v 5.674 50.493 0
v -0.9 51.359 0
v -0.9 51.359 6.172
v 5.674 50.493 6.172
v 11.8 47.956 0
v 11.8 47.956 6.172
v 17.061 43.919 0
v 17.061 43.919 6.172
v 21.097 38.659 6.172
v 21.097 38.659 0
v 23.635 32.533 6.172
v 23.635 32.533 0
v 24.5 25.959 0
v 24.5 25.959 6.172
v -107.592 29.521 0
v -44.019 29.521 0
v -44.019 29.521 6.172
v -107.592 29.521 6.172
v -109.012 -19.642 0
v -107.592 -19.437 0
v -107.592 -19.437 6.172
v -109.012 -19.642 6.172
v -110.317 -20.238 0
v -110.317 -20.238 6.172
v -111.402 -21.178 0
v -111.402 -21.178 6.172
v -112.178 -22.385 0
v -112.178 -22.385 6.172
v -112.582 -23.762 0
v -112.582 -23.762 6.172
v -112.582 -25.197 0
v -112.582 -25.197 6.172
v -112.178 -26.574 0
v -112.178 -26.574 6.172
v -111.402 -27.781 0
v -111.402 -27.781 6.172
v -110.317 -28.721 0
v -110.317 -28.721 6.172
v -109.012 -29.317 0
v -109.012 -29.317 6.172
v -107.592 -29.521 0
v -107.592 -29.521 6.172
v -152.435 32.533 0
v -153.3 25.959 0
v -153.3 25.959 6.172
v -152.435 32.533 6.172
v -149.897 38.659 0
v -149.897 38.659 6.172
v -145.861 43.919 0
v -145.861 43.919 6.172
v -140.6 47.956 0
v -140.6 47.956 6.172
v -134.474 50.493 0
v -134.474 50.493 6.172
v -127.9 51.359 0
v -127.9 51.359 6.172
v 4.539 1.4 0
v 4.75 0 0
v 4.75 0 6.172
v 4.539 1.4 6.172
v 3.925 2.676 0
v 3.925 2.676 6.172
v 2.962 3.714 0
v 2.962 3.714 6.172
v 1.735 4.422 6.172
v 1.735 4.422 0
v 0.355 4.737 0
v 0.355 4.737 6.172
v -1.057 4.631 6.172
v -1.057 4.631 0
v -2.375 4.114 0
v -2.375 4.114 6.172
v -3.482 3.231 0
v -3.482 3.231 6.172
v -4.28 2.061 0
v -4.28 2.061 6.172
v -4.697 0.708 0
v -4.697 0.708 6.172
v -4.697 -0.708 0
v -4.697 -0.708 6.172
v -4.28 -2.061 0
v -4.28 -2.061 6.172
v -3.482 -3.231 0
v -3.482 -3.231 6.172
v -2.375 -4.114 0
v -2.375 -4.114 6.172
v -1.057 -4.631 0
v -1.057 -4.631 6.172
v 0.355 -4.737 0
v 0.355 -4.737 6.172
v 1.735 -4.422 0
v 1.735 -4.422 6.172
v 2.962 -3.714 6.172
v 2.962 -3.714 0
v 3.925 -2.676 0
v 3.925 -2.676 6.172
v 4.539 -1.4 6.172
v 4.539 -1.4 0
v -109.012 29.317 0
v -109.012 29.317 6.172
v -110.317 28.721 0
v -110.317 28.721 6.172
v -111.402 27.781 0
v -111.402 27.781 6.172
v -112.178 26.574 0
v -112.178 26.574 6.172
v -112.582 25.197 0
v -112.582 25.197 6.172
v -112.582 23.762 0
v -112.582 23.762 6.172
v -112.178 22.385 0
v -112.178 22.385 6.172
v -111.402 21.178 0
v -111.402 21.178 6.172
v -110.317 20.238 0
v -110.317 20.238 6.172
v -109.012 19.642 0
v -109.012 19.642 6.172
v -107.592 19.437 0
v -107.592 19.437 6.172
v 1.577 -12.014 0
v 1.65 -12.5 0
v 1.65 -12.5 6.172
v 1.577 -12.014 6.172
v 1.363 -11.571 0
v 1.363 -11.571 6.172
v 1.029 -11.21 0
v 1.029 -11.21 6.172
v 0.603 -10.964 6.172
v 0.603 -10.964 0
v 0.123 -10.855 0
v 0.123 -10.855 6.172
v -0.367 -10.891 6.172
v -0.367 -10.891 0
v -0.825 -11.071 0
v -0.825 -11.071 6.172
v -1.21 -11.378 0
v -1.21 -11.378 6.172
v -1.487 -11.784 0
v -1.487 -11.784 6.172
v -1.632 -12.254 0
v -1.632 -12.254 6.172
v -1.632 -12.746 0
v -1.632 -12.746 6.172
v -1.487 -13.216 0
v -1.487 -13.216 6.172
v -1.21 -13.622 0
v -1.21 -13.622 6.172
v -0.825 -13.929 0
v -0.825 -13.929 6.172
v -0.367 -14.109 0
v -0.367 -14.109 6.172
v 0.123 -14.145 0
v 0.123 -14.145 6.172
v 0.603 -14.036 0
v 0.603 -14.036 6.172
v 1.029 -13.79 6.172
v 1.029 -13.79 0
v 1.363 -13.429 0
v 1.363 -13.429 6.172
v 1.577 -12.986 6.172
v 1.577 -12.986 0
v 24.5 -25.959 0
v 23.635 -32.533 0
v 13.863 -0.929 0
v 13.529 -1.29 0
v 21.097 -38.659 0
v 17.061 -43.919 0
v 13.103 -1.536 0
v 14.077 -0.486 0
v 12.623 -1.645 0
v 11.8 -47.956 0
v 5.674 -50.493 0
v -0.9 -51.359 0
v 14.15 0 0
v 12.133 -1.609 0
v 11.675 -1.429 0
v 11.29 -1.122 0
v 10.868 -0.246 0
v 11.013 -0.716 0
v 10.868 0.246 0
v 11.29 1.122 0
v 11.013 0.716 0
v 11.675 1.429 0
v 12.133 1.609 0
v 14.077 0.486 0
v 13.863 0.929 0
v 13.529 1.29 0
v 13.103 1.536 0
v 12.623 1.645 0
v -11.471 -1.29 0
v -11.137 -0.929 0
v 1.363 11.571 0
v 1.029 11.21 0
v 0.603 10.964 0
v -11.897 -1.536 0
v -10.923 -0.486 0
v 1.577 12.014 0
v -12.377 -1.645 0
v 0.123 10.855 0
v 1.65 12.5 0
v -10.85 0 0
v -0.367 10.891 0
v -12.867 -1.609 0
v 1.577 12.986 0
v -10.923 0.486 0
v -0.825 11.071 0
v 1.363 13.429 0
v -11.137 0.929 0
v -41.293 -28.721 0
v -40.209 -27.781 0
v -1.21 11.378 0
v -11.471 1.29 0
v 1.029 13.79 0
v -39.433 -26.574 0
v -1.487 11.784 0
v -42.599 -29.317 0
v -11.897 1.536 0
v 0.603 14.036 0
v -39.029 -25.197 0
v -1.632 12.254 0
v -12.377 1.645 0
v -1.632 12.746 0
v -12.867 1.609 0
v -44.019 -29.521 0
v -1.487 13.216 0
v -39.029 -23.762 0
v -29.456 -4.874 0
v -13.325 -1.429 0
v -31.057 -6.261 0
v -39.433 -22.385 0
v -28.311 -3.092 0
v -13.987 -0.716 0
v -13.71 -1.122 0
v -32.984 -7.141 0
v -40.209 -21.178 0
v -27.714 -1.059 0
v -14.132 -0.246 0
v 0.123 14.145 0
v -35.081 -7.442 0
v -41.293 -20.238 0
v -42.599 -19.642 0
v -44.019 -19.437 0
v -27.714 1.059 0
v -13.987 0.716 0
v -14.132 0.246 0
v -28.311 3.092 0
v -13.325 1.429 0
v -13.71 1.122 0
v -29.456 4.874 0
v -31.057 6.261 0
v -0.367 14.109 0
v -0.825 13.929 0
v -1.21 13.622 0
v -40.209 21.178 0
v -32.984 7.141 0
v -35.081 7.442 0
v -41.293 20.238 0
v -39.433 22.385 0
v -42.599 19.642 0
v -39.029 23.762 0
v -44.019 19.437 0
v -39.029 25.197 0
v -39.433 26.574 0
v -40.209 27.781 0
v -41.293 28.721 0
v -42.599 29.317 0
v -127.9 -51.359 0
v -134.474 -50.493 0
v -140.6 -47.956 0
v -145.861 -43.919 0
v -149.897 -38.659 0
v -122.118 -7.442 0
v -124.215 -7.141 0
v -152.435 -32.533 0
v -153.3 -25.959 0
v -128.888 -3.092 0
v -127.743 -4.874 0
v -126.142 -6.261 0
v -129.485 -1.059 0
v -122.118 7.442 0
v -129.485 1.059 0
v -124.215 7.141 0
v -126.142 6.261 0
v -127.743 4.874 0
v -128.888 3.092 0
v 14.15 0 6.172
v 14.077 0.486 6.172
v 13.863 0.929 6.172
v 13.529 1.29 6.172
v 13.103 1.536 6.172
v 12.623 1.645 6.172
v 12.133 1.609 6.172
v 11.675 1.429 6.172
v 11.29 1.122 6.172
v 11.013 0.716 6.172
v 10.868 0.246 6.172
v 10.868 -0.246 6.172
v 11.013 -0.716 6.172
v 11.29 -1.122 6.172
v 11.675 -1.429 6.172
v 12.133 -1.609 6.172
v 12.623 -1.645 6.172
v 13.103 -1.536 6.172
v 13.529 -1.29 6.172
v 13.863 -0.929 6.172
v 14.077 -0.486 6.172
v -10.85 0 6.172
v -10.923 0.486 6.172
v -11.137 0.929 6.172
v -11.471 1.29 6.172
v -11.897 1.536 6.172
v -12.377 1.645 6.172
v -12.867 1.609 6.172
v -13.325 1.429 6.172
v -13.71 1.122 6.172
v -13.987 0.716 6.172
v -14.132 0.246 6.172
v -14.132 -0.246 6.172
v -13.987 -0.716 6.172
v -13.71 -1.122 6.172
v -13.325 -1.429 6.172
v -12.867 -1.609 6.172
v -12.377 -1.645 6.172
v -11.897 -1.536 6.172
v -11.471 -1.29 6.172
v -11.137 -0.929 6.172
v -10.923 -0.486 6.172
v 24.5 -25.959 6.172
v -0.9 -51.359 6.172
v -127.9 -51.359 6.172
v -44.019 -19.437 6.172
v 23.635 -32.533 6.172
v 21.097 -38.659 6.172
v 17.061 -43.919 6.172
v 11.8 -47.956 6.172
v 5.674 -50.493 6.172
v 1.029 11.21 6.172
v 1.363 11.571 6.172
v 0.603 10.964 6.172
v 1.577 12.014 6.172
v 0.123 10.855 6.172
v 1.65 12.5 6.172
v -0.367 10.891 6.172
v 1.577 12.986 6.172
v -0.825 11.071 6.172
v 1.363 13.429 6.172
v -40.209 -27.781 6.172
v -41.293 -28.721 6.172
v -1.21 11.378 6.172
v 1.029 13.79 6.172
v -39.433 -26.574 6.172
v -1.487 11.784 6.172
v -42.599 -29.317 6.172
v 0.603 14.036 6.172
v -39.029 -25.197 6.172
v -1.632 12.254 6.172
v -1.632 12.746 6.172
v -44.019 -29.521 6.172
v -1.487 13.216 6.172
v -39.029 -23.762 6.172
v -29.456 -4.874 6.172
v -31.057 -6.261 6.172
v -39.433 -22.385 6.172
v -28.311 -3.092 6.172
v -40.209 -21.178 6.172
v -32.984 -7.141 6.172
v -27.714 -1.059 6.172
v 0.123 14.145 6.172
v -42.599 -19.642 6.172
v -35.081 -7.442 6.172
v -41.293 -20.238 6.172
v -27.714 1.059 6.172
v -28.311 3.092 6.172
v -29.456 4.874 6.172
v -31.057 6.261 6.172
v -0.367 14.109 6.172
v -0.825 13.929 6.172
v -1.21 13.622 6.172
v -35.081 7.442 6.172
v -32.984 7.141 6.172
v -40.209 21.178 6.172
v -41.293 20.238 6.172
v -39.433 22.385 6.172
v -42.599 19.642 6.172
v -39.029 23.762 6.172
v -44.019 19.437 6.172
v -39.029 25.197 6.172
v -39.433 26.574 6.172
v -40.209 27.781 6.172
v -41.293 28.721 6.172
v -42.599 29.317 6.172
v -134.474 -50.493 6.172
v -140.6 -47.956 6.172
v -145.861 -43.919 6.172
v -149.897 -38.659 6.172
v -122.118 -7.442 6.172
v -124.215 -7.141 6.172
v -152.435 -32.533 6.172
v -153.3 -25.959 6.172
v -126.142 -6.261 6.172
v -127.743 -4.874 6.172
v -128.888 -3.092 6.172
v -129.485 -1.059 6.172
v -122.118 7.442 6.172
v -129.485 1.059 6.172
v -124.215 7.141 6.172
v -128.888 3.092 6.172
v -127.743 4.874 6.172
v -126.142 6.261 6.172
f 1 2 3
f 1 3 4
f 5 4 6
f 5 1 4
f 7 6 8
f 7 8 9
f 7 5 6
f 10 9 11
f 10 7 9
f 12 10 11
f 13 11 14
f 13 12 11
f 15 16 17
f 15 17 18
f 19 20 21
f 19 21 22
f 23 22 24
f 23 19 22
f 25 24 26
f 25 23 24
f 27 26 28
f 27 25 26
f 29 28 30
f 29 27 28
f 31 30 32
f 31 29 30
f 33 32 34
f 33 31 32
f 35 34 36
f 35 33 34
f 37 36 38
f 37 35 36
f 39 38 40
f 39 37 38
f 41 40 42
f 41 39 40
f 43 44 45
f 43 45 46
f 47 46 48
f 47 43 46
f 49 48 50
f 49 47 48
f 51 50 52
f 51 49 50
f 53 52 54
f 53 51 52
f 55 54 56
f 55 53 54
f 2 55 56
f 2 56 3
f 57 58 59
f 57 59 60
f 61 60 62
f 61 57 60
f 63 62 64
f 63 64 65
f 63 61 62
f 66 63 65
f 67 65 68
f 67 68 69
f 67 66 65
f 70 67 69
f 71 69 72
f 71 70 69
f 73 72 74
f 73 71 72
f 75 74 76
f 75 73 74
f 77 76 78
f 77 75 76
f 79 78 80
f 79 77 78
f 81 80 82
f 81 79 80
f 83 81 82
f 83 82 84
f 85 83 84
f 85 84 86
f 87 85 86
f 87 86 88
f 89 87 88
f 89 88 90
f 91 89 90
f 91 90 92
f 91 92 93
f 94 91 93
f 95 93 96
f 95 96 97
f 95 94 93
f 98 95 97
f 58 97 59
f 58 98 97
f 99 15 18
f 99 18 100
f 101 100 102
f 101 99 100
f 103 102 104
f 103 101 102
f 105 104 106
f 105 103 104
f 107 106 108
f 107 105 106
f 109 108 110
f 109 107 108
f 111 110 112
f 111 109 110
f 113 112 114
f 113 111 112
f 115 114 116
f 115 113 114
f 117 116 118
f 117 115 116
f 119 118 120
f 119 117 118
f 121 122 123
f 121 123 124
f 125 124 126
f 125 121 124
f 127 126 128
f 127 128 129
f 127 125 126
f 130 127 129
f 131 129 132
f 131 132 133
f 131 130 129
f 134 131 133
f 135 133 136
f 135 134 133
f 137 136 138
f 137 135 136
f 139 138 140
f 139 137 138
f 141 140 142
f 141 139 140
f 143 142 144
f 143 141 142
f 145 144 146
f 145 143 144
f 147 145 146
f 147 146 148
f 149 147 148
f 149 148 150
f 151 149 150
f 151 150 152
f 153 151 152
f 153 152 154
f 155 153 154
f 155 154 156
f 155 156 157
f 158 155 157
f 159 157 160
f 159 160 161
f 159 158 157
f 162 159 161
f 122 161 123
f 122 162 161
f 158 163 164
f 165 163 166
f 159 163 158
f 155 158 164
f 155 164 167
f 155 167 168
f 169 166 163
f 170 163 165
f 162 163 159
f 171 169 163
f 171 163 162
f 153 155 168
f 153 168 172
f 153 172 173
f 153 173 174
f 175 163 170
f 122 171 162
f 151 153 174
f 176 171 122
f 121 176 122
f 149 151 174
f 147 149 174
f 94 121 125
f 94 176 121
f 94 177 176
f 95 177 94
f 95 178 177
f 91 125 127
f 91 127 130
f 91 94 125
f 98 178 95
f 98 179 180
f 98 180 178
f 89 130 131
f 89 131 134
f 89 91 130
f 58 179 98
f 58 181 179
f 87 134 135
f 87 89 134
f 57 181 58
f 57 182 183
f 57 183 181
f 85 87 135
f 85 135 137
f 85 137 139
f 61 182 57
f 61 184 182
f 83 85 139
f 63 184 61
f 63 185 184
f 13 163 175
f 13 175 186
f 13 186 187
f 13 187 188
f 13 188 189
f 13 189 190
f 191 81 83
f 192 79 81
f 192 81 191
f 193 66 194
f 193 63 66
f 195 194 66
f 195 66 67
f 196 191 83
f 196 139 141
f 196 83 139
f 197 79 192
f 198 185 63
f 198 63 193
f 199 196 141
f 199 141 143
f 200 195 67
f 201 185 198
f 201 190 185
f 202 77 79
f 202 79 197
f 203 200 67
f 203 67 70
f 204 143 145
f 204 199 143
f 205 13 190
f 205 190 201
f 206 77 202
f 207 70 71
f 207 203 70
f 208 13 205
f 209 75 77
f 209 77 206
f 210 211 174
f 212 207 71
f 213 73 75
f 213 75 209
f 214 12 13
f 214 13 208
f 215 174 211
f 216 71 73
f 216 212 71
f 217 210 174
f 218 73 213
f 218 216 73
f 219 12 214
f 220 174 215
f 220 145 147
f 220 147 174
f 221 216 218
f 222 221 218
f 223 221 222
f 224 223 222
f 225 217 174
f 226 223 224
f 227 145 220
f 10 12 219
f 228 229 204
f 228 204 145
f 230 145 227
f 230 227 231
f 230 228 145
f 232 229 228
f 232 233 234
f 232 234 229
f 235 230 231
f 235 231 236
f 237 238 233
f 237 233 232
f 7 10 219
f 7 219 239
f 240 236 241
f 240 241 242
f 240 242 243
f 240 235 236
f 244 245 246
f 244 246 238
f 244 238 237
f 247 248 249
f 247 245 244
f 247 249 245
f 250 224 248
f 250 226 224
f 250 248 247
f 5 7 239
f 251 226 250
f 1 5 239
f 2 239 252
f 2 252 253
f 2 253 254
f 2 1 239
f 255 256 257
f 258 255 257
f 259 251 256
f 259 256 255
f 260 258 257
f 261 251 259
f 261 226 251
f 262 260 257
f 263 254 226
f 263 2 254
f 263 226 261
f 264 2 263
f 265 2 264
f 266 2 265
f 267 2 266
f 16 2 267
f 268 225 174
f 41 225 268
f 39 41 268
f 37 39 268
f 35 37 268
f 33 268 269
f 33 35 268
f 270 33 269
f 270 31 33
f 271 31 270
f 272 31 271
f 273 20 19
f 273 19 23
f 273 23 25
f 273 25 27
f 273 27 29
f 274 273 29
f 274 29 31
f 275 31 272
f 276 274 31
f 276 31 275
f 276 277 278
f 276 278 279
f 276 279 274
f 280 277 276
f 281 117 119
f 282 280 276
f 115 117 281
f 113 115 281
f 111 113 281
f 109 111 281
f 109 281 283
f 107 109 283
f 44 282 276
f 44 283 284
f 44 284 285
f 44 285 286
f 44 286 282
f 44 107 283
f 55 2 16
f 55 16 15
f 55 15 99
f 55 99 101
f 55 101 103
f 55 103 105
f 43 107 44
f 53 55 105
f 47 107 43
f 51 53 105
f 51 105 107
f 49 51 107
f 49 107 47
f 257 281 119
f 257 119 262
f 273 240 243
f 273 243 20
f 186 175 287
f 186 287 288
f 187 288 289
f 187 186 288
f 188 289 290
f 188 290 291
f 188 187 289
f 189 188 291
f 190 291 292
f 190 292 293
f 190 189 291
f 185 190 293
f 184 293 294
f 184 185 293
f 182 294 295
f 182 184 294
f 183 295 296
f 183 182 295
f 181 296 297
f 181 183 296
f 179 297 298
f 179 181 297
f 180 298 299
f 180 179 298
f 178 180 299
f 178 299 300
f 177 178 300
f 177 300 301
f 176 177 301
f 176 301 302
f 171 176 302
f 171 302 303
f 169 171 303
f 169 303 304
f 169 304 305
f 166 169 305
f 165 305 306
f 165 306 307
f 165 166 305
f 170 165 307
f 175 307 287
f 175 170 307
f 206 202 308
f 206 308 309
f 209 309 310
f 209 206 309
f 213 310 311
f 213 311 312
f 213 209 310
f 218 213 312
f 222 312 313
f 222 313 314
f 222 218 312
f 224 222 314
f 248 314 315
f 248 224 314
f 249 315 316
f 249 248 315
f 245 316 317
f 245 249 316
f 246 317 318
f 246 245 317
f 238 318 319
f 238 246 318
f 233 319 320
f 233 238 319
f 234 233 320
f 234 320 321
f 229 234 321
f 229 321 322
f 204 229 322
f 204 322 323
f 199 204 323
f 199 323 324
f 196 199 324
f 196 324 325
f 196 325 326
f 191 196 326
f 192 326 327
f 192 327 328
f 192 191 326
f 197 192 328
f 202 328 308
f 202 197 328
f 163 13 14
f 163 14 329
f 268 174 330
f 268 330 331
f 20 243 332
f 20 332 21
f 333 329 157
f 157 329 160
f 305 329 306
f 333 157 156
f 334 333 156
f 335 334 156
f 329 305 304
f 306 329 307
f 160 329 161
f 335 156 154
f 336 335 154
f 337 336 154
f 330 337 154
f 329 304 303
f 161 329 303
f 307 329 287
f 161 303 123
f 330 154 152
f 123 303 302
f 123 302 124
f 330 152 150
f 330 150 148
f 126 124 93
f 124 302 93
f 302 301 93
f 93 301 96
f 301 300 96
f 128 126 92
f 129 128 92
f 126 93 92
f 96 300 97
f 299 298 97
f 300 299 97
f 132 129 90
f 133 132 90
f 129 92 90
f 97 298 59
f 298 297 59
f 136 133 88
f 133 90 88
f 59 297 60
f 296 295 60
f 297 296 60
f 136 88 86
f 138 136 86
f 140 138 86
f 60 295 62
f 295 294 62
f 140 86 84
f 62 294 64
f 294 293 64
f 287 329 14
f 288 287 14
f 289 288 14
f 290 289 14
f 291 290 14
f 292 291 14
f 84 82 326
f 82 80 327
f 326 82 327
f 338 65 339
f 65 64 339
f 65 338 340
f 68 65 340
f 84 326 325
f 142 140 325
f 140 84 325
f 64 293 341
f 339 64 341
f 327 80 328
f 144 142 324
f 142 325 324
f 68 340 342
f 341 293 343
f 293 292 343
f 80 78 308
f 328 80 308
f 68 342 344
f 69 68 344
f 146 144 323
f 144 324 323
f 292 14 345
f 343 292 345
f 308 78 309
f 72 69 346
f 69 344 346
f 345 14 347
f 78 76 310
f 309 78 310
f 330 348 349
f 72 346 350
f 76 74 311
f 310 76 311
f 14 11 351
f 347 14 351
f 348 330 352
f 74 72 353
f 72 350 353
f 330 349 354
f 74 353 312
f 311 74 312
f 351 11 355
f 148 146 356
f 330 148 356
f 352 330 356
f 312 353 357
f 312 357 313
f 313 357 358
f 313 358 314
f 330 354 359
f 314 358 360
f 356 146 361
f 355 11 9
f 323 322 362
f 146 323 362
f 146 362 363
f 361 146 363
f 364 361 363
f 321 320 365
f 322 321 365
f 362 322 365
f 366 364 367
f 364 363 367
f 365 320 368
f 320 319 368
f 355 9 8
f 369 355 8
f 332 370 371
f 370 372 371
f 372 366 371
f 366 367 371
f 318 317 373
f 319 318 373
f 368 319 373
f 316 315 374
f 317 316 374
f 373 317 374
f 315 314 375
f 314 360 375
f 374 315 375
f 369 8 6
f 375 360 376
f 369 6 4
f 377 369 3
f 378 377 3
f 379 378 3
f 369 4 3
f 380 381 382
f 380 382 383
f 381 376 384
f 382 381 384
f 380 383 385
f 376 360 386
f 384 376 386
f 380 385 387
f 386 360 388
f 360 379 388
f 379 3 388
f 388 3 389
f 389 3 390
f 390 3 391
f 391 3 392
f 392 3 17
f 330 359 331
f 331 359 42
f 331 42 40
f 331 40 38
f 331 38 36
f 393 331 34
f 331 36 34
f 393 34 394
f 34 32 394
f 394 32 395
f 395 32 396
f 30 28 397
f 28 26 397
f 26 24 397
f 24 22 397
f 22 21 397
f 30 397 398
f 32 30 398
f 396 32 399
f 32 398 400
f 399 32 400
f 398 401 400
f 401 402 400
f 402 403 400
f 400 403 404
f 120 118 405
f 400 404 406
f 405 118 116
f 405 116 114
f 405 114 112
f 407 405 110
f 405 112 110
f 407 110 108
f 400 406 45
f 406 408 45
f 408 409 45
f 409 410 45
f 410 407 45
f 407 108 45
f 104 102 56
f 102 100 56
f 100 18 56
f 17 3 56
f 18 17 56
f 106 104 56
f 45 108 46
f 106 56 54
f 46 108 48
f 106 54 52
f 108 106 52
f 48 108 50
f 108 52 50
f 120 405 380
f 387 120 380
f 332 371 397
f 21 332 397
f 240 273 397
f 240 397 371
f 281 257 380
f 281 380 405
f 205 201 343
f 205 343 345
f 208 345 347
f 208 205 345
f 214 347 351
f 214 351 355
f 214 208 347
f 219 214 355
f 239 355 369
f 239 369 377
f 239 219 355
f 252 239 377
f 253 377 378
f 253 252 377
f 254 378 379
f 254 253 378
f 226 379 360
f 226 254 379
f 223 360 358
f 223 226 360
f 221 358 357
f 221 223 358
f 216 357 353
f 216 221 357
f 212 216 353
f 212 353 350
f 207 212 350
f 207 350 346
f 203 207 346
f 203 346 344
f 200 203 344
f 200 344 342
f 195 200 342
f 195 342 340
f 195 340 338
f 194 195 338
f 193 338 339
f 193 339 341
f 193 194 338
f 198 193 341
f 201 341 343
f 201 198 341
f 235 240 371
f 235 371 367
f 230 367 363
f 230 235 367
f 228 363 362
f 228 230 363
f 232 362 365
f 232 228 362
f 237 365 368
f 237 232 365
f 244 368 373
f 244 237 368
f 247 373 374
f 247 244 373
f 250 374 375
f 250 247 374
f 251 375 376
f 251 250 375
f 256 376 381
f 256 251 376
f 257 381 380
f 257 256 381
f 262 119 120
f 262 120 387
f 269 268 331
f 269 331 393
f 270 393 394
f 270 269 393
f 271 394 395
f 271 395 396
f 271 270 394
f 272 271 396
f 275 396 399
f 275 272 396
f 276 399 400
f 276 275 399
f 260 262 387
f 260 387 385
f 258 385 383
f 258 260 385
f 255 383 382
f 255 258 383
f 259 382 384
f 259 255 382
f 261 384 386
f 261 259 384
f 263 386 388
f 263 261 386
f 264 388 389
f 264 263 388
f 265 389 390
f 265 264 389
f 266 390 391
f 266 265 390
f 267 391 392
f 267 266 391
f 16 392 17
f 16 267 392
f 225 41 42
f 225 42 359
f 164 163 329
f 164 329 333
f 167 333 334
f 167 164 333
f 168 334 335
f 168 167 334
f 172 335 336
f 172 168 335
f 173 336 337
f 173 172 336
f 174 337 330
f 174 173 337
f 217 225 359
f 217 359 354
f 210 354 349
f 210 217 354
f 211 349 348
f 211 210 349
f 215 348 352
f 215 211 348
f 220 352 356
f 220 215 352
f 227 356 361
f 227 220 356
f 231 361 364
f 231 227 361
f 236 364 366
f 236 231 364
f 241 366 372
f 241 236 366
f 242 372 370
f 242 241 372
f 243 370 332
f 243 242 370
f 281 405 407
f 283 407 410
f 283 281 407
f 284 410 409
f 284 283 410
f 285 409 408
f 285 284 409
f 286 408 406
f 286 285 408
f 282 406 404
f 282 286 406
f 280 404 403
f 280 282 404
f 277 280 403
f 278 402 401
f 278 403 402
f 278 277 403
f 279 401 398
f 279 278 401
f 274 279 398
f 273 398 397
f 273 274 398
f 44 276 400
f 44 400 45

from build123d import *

# Parameters (mm, degrees)
SKETCH1_R           = 1.65
SKETCH1_R_2         = 4.75
BOSS_EXTRUDE1_DEPTH = 6.1722
CUT_EXTRUDE1_DEPTH  = 162.792188904


with BuildPart() as part:
    # Sketch1 → Boss-Extrude1 (new body)
    with BuildSketch(Plane.XY):
        with BuildLine():
            Line((-0.9, -51.3588), (-127.9, -51.3588))
            ThreePointArc((-127.9, -51.3588), (-145.860512242, -43.919312242), (-153.3, -25.9588))
            Line((-153.3, -25.9588), (-153.3, 25.9588))
            ThreePointArc((-153.3, 25.9588), (-145.860512242, 43.919312242), (-127.9, 51.3588))
            Line((-127.9, 51.3588), (-0.9, 51.3588))
            ThreePointArc((-0.9, 51.3588), (17.060512242, 43.919312242), (24.5, 25.9588))
            Line((24.5, 25.9588), (24.5, -25.9588))
            ThreePointArc((24.5, -25.9588), (17.060512242, -43.919312242), (-0.9, -51.3588))
        make_face()
        with Locations((12.5, 0)):
            Circle(SKETCH1_R, mode=Mode.SUBTRACT)
        with Locations((0, -12.5)):
            Circle(SKETCH1_R, mode=Mode.SUBTRACT)
        with Locations((-12.5, 0)):
            Circle(SKETCH1_R, mode=Mode.SUBTRACT)
        with Locations((0, 12.5)):
            Circle(SKETCH1_R, mode=Mode.SUBTRACT)
        Circle(SKETCH1_R_2, mode=Mode.SUBTRACT)
    extrude(amount=BOSS_EXTRUDE1_DEPTH)

    # Sketch2 → Cut-Extrude1 (cut, through all)
    with BuildSketch(Plane(origin=(0, 0, 0), x_dir=(-1, 0, 0), z_dir=(0, 0, -1))):
        with BuildLine():
            Line((44.019348423, 29.52115), (107.591551577, 29.52115))
            ThreePointArc((107.591551577, 29.52115), (112.633451577, 24.47925), (107.591551577, 19.43735))
            Line((107.591551577, 19.43735), (44.019348423, 19.43735))
            ThreePointArc((44.019348423, 19.43735), (38.977448423, 24.47925), (44.019348423, 29.52115))
        make_face()
        with BuildLine():
            Line((44.019348423, -19.43735), (107.591551577, -19.43735))
            ThreePointArc((107.591551577, -19.43735), (112.633451577, -24.47925), (107.591551577, -29.52115))
            Line((107.591551577, -29.52115), (44.019348423, -29.52115))
            ThreePointArc((44.019348423, -29.52115), (38.977448423, -24.47925), (44.019348423, -19.43735))
        make_face()
        with BuildLine():
            Line((35.080546846, 7.4422), (122.118353154, 7.4422))
            ThreePointArc((122.118353154, 7.4422), (129.560553154, 0), (122.118353154, -7.4422))
            Line((122.118353154, -7.4422), (35.080546846, -7.4422))
            ThreePointArc((35.080546846, -7.4422), (27.638346846, 0), (35.080546846, 7.4422))
        make_face()
    extrude(amount=-CUT_EXTRUDE1_DEPTH, mode=Mode.SUBTRACT)


solid = part.part
